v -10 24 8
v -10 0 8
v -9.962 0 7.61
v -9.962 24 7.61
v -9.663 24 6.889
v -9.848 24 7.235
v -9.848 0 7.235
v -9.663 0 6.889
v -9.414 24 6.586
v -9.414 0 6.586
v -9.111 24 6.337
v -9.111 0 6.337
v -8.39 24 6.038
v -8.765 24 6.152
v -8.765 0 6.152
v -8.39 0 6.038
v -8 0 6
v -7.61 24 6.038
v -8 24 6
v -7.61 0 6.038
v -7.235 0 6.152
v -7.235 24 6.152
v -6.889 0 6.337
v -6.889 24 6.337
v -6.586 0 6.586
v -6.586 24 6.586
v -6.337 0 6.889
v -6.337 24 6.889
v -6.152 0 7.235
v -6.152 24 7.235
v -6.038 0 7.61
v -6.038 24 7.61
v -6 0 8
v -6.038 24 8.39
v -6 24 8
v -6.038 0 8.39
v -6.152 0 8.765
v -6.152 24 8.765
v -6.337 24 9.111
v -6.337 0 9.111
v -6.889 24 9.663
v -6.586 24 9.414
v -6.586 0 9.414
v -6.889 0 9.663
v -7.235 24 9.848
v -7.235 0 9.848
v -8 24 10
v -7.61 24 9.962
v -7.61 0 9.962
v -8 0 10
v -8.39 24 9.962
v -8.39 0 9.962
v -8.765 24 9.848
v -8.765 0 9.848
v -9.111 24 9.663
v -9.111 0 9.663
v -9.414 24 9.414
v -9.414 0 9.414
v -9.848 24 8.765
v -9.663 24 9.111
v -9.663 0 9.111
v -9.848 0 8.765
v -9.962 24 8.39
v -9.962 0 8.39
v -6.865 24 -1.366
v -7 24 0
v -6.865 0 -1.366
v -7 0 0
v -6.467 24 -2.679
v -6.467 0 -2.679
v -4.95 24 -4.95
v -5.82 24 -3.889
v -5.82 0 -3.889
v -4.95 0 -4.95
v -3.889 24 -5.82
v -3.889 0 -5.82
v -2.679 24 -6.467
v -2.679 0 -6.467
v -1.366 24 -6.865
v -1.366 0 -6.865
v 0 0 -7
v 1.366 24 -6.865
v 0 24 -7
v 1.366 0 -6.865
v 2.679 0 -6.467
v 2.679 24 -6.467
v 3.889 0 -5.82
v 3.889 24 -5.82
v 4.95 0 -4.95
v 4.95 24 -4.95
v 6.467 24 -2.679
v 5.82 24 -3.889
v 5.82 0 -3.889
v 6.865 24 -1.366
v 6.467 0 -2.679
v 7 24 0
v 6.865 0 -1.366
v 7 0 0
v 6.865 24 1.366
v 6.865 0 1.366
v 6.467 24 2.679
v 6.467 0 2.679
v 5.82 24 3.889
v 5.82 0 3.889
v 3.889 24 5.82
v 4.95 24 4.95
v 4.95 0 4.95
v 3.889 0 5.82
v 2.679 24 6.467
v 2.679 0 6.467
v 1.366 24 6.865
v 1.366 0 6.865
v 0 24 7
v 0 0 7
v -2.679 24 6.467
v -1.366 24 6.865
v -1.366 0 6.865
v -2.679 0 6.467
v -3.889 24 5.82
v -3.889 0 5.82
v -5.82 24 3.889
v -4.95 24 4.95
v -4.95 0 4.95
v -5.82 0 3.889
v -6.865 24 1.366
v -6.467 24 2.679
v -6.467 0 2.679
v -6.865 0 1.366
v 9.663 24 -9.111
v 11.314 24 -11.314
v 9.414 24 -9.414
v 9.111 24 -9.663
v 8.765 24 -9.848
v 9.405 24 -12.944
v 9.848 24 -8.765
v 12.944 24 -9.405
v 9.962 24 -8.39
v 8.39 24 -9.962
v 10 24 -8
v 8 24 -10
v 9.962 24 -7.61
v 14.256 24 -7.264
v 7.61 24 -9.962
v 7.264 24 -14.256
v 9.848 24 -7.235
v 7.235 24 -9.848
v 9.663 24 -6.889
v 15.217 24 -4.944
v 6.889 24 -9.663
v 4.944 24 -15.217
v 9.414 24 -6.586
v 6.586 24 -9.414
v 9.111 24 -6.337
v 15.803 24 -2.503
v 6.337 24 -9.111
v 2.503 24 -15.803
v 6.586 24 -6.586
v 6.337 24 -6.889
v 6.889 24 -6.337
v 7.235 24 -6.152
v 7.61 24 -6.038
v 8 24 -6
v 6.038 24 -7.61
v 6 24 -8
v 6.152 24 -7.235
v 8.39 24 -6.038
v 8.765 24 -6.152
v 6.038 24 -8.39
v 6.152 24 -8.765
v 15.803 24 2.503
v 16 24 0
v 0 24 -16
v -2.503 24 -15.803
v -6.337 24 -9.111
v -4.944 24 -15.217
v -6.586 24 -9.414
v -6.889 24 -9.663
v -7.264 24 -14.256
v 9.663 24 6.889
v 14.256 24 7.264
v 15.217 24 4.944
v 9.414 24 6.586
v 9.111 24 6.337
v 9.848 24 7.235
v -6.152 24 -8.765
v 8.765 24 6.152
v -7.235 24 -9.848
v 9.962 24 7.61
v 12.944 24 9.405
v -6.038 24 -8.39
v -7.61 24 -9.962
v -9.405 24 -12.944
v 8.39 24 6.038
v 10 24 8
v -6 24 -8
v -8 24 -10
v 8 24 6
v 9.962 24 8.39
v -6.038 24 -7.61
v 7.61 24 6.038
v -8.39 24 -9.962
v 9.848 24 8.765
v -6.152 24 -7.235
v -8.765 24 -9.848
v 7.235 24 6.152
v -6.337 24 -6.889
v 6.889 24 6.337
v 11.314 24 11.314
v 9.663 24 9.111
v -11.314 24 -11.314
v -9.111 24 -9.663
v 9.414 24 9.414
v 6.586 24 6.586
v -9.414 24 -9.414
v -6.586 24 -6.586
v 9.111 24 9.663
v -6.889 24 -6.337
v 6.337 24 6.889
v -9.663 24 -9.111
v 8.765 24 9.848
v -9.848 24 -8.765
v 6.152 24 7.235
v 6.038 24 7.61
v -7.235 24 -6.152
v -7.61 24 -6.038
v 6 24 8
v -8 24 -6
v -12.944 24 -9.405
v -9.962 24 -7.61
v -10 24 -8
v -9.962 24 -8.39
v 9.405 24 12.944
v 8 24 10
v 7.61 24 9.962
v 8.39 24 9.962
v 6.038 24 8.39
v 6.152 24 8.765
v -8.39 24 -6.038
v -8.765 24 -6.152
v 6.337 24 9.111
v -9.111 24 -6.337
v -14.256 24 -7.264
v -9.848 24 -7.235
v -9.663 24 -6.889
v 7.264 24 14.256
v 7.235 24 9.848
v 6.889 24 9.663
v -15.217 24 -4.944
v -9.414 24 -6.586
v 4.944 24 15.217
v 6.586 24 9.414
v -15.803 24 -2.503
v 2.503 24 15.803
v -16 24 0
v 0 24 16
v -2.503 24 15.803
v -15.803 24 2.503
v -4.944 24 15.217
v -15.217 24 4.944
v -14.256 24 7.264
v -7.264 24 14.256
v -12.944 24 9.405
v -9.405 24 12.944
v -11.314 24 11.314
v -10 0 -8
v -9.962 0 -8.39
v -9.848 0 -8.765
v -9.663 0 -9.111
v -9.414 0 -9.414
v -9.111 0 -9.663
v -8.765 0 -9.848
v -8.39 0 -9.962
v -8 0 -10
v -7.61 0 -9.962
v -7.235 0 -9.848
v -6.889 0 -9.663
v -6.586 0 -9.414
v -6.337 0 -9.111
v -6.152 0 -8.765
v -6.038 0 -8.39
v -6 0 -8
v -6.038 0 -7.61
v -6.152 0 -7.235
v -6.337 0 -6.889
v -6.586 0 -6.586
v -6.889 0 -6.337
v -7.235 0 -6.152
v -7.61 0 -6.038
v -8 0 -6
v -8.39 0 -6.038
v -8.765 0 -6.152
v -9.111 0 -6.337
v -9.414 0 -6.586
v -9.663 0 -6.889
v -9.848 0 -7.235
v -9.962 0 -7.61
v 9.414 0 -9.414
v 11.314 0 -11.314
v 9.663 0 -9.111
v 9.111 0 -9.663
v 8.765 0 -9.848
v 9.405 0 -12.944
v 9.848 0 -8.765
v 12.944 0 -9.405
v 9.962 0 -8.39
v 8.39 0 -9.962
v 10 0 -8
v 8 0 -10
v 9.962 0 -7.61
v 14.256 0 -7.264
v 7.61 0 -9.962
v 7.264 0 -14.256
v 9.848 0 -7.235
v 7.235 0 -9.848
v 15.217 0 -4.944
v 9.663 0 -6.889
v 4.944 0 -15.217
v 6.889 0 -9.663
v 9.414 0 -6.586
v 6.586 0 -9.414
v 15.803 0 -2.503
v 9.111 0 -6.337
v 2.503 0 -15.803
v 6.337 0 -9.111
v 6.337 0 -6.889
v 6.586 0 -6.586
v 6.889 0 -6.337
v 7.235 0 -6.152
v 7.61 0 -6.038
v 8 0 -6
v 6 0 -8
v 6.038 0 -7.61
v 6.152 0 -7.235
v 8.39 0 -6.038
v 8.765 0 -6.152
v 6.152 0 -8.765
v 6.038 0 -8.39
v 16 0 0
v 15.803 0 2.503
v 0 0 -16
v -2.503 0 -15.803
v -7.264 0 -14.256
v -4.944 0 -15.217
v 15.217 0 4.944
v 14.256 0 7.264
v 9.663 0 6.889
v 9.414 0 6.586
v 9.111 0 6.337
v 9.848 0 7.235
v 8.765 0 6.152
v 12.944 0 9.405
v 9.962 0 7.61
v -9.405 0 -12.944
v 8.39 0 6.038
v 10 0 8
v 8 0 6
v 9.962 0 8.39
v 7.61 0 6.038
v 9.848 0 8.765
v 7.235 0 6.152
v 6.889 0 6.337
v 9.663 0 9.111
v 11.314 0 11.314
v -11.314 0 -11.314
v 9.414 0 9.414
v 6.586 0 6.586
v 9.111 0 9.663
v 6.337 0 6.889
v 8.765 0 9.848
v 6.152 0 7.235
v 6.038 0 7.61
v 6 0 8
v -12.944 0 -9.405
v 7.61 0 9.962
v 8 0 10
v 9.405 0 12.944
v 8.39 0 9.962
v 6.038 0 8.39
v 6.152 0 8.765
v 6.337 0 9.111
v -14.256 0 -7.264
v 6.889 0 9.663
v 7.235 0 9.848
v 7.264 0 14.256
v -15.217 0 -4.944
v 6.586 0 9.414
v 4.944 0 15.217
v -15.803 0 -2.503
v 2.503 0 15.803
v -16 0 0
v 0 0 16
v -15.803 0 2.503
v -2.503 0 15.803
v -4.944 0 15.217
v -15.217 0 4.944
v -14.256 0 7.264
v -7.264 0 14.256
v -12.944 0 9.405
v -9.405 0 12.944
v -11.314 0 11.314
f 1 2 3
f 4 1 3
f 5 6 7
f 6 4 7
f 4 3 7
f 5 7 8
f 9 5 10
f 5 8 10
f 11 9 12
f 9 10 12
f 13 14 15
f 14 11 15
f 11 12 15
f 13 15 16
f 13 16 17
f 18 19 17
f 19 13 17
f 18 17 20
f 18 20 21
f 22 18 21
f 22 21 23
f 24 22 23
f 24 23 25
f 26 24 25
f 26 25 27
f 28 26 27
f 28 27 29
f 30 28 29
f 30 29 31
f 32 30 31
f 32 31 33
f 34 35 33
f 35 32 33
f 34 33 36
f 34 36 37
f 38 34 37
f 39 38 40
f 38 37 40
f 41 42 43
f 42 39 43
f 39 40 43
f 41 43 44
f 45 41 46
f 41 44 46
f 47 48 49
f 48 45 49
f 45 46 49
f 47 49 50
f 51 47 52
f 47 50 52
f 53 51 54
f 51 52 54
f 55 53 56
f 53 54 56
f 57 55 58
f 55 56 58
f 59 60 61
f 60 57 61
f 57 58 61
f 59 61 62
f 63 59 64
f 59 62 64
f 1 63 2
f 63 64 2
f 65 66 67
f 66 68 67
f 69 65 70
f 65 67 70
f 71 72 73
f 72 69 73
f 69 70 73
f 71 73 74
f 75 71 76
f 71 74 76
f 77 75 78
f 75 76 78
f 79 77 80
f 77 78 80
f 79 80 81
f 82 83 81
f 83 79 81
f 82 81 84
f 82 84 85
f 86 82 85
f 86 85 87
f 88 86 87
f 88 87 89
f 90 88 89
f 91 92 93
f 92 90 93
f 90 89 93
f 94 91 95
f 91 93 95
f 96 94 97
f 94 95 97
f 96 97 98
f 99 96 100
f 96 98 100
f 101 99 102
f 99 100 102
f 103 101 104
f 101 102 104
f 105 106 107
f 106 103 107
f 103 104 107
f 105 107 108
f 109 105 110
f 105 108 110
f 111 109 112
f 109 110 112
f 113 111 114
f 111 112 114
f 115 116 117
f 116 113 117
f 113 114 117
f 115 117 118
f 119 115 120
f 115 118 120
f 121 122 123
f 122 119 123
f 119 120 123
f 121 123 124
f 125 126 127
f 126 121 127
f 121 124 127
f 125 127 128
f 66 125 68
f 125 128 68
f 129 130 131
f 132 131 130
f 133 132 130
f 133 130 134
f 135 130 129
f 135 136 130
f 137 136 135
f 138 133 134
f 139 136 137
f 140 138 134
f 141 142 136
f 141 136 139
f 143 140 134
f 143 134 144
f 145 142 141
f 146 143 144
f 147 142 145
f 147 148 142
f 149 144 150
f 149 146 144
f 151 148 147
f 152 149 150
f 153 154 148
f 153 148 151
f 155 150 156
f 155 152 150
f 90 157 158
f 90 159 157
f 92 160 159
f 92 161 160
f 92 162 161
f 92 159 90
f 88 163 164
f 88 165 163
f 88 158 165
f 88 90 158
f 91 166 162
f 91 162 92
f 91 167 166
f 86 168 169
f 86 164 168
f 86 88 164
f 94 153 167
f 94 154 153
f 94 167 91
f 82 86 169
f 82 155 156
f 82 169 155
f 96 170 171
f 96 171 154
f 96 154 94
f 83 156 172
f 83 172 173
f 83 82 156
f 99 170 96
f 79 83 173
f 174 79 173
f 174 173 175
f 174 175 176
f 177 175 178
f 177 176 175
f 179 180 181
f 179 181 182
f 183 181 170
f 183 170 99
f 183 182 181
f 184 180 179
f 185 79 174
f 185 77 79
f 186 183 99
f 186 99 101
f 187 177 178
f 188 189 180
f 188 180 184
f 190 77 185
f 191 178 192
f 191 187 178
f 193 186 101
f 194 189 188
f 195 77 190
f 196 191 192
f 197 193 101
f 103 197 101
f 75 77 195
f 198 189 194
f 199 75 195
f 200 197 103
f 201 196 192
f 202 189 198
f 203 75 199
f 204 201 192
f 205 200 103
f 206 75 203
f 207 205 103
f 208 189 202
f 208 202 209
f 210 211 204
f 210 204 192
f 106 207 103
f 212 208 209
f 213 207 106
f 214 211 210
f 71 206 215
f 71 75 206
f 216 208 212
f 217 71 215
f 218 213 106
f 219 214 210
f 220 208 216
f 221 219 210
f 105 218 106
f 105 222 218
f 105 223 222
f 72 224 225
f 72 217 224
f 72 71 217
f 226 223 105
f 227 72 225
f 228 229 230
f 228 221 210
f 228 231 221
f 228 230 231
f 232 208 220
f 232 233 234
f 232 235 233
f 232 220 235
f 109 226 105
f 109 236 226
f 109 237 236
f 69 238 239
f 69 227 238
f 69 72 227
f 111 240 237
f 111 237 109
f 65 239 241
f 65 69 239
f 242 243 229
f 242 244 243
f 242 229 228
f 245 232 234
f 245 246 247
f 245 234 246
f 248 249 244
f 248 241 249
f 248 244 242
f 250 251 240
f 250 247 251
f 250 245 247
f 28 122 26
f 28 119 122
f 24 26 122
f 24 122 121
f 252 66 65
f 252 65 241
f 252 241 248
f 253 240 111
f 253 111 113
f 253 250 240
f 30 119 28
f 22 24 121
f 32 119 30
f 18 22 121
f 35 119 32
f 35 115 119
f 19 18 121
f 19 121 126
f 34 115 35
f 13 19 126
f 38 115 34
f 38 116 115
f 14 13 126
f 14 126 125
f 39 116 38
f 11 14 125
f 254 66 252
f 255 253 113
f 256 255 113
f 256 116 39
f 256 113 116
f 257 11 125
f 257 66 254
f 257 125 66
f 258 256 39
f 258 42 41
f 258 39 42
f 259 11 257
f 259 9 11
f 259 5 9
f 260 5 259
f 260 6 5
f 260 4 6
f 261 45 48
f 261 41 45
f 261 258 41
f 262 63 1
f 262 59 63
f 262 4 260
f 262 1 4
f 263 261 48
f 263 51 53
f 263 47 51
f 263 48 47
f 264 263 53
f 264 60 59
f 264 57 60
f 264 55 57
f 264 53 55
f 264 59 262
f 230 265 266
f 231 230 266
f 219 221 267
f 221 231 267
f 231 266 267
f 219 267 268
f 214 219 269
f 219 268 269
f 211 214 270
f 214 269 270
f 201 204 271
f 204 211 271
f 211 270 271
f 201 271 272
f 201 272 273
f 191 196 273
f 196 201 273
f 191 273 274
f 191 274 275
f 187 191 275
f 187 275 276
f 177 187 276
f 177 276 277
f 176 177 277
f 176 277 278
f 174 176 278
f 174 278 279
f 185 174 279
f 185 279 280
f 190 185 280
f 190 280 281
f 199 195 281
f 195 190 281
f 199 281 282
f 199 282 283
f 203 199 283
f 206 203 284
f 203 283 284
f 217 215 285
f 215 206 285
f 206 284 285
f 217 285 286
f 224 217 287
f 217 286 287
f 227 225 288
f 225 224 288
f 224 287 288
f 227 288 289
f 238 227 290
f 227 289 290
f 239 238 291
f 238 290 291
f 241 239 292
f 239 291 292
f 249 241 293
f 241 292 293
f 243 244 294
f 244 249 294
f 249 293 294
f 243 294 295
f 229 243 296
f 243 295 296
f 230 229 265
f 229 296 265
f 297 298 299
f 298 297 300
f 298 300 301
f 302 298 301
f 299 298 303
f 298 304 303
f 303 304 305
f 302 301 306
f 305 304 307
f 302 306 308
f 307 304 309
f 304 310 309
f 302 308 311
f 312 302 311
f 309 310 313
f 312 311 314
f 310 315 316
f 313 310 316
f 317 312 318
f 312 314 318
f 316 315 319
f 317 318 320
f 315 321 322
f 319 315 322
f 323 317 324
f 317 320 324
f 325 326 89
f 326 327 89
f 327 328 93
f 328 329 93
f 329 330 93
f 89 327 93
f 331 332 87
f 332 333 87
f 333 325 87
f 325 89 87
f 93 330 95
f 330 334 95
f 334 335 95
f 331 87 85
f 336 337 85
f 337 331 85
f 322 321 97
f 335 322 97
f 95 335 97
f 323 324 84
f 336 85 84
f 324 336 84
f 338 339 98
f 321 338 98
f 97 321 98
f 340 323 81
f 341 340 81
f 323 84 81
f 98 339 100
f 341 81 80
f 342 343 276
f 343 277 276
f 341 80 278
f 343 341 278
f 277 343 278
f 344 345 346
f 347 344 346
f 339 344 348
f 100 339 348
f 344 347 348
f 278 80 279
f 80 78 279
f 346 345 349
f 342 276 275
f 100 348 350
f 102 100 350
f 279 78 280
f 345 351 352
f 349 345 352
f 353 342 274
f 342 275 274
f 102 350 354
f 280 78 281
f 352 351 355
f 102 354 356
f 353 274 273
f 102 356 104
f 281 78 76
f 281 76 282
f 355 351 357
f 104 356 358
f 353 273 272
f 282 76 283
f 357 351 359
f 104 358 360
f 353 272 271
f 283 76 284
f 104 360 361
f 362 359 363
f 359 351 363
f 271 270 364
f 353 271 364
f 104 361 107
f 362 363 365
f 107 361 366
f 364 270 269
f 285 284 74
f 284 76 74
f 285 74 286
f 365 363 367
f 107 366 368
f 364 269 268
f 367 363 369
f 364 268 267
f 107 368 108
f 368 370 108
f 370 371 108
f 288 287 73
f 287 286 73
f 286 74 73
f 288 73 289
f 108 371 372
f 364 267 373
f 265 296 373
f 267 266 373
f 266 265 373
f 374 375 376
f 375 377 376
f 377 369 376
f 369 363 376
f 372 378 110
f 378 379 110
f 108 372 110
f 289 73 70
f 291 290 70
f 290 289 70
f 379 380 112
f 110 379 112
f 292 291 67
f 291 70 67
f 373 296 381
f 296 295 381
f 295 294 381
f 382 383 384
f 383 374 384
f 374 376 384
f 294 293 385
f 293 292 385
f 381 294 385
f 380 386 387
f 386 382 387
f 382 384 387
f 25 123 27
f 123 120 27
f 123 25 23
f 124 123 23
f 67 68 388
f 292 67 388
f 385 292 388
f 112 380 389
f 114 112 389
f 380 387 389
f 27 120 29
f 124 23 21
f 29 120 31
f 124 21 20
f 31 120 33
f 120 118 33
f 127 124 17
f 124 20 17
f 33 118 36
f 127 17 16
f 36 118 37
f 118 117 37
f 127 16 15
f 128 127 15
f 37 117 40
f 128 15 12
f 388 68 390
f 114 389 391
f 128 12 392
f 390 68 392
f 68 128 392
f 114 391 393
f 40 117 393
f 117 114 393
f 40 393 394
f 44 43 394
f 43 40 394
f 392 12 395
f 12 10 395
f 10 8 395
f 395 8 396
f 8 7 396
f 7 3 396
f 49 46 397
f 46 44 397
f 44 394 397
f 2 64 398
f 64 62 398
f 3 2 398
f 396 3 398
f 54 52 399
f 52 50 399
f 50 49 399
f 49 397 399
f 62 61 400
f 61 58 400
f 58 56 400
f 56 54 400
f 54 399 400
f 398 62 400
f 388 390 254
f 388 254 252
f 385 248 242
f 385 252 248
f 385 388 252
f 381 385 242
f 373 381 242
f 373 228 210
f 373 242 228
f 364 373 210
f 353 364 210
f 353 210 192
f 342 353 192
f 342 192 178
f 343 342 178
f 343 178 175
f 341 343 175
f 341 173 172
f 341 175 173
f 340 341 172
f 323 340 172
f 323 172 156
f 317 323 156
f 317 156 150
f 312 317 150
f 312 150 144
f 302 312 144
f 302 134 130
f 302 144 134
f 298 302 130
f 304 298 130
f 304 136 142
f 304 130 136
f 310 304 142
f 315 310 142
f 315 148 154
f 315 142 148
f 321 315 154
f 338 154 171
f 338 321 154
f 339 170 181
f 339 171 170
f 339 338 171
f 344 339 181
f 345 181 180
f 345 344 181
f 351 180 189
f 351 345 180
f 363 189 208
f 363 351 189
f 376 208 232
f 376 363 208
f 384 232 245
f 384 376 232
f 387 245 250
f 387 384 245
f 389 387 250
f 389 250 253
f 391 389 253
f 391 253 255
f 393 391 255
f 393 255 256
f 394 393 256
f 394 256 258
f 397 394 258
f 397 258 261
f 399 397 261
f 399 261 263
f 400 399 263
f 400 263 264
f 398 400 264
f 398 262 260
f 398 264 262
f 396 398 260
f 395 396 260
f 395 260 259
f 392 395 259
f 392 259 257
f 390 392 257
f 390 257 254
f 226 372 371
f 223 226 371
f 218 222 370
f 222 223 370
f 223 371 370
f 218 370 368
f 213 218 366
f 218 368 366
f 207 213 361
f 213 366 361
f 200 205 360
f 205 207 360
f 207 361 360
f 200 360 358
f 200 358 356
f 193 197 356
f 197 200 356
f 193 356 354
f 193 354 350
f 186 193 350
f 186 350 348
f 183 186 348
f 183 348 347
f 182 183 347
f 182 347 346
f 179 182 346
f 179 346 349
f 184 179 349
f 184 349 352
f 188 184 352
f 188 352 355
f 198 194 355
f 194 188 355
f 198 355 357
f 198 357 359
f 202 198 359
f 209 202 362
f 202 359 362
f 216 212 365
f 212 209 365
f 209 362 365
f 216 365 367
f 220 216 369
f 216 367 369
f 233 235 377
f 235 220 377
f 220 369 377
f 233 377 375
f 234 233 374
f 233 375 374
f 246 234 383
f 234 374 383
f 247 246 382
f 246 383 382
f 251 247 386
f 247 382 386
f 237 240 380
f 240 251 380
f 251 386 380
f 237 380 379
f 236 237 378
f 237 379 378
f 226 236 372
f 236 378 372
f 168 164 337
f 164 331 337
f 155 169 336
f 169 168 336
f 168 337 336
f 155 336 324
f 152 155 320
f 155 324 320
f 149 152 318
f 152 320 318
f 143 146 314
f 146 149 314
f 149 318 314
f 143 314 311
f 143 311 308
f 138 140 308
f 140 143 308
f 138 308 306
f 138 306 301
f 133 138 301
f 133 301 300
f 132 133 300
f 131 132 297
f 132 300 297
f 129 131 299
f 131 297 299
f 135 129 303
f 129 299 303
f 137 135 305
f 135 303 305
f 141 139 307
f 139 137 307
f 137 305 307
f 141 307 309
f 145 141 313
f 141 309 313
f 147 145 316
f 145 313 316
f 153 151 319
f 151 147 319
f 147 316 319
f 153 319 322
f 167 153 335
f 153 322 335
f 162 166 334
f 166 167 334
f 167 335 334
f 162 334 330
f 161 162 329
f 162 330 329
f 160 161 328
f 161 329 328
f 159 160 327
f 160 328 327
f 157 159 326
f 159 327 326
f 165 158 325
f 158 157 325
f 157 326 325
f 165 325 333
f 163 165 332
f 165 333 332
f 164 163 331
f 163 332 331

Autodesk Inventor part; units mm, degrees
ref_plane "YZ Plane" through (0, 0, 0) normal (1, 0, 0) x (0, 1, 0)
ref_plane "XZ Plane" through (0, 0, 0) normal (0, 1, 0) x (-1, 0, 0)
ref_plane "XY Plane" through (0, 0, 0) normal (0, 0, 1) x (1, 0, 0)
sketch "Sketch1" plane through (0, 0, 0) normal (0, 1, 0) x (-1, 0, 0)
  circle A0 centre (0, 0) radius 7
  circle A1 centre (0, 0) radius 16
  circle A2 centre (8, 8) radius 2
  circle A3 centre (-8, 8) radius 2
  circle A4 centre (-8, -8) radius 2
  circle A5 centre (8, -8) radius 2
  dimension "d0" = 14
  dimension "d1" = 32
  dimension "d4" = 4
  dimension "d5" = 8
  dimension "d6" = 8
  dimension "d9" = 360
extrude "Extrusion1" add sketch "Sketch1" along normal blind 24
properties part number "MotorPulleySpacer"
